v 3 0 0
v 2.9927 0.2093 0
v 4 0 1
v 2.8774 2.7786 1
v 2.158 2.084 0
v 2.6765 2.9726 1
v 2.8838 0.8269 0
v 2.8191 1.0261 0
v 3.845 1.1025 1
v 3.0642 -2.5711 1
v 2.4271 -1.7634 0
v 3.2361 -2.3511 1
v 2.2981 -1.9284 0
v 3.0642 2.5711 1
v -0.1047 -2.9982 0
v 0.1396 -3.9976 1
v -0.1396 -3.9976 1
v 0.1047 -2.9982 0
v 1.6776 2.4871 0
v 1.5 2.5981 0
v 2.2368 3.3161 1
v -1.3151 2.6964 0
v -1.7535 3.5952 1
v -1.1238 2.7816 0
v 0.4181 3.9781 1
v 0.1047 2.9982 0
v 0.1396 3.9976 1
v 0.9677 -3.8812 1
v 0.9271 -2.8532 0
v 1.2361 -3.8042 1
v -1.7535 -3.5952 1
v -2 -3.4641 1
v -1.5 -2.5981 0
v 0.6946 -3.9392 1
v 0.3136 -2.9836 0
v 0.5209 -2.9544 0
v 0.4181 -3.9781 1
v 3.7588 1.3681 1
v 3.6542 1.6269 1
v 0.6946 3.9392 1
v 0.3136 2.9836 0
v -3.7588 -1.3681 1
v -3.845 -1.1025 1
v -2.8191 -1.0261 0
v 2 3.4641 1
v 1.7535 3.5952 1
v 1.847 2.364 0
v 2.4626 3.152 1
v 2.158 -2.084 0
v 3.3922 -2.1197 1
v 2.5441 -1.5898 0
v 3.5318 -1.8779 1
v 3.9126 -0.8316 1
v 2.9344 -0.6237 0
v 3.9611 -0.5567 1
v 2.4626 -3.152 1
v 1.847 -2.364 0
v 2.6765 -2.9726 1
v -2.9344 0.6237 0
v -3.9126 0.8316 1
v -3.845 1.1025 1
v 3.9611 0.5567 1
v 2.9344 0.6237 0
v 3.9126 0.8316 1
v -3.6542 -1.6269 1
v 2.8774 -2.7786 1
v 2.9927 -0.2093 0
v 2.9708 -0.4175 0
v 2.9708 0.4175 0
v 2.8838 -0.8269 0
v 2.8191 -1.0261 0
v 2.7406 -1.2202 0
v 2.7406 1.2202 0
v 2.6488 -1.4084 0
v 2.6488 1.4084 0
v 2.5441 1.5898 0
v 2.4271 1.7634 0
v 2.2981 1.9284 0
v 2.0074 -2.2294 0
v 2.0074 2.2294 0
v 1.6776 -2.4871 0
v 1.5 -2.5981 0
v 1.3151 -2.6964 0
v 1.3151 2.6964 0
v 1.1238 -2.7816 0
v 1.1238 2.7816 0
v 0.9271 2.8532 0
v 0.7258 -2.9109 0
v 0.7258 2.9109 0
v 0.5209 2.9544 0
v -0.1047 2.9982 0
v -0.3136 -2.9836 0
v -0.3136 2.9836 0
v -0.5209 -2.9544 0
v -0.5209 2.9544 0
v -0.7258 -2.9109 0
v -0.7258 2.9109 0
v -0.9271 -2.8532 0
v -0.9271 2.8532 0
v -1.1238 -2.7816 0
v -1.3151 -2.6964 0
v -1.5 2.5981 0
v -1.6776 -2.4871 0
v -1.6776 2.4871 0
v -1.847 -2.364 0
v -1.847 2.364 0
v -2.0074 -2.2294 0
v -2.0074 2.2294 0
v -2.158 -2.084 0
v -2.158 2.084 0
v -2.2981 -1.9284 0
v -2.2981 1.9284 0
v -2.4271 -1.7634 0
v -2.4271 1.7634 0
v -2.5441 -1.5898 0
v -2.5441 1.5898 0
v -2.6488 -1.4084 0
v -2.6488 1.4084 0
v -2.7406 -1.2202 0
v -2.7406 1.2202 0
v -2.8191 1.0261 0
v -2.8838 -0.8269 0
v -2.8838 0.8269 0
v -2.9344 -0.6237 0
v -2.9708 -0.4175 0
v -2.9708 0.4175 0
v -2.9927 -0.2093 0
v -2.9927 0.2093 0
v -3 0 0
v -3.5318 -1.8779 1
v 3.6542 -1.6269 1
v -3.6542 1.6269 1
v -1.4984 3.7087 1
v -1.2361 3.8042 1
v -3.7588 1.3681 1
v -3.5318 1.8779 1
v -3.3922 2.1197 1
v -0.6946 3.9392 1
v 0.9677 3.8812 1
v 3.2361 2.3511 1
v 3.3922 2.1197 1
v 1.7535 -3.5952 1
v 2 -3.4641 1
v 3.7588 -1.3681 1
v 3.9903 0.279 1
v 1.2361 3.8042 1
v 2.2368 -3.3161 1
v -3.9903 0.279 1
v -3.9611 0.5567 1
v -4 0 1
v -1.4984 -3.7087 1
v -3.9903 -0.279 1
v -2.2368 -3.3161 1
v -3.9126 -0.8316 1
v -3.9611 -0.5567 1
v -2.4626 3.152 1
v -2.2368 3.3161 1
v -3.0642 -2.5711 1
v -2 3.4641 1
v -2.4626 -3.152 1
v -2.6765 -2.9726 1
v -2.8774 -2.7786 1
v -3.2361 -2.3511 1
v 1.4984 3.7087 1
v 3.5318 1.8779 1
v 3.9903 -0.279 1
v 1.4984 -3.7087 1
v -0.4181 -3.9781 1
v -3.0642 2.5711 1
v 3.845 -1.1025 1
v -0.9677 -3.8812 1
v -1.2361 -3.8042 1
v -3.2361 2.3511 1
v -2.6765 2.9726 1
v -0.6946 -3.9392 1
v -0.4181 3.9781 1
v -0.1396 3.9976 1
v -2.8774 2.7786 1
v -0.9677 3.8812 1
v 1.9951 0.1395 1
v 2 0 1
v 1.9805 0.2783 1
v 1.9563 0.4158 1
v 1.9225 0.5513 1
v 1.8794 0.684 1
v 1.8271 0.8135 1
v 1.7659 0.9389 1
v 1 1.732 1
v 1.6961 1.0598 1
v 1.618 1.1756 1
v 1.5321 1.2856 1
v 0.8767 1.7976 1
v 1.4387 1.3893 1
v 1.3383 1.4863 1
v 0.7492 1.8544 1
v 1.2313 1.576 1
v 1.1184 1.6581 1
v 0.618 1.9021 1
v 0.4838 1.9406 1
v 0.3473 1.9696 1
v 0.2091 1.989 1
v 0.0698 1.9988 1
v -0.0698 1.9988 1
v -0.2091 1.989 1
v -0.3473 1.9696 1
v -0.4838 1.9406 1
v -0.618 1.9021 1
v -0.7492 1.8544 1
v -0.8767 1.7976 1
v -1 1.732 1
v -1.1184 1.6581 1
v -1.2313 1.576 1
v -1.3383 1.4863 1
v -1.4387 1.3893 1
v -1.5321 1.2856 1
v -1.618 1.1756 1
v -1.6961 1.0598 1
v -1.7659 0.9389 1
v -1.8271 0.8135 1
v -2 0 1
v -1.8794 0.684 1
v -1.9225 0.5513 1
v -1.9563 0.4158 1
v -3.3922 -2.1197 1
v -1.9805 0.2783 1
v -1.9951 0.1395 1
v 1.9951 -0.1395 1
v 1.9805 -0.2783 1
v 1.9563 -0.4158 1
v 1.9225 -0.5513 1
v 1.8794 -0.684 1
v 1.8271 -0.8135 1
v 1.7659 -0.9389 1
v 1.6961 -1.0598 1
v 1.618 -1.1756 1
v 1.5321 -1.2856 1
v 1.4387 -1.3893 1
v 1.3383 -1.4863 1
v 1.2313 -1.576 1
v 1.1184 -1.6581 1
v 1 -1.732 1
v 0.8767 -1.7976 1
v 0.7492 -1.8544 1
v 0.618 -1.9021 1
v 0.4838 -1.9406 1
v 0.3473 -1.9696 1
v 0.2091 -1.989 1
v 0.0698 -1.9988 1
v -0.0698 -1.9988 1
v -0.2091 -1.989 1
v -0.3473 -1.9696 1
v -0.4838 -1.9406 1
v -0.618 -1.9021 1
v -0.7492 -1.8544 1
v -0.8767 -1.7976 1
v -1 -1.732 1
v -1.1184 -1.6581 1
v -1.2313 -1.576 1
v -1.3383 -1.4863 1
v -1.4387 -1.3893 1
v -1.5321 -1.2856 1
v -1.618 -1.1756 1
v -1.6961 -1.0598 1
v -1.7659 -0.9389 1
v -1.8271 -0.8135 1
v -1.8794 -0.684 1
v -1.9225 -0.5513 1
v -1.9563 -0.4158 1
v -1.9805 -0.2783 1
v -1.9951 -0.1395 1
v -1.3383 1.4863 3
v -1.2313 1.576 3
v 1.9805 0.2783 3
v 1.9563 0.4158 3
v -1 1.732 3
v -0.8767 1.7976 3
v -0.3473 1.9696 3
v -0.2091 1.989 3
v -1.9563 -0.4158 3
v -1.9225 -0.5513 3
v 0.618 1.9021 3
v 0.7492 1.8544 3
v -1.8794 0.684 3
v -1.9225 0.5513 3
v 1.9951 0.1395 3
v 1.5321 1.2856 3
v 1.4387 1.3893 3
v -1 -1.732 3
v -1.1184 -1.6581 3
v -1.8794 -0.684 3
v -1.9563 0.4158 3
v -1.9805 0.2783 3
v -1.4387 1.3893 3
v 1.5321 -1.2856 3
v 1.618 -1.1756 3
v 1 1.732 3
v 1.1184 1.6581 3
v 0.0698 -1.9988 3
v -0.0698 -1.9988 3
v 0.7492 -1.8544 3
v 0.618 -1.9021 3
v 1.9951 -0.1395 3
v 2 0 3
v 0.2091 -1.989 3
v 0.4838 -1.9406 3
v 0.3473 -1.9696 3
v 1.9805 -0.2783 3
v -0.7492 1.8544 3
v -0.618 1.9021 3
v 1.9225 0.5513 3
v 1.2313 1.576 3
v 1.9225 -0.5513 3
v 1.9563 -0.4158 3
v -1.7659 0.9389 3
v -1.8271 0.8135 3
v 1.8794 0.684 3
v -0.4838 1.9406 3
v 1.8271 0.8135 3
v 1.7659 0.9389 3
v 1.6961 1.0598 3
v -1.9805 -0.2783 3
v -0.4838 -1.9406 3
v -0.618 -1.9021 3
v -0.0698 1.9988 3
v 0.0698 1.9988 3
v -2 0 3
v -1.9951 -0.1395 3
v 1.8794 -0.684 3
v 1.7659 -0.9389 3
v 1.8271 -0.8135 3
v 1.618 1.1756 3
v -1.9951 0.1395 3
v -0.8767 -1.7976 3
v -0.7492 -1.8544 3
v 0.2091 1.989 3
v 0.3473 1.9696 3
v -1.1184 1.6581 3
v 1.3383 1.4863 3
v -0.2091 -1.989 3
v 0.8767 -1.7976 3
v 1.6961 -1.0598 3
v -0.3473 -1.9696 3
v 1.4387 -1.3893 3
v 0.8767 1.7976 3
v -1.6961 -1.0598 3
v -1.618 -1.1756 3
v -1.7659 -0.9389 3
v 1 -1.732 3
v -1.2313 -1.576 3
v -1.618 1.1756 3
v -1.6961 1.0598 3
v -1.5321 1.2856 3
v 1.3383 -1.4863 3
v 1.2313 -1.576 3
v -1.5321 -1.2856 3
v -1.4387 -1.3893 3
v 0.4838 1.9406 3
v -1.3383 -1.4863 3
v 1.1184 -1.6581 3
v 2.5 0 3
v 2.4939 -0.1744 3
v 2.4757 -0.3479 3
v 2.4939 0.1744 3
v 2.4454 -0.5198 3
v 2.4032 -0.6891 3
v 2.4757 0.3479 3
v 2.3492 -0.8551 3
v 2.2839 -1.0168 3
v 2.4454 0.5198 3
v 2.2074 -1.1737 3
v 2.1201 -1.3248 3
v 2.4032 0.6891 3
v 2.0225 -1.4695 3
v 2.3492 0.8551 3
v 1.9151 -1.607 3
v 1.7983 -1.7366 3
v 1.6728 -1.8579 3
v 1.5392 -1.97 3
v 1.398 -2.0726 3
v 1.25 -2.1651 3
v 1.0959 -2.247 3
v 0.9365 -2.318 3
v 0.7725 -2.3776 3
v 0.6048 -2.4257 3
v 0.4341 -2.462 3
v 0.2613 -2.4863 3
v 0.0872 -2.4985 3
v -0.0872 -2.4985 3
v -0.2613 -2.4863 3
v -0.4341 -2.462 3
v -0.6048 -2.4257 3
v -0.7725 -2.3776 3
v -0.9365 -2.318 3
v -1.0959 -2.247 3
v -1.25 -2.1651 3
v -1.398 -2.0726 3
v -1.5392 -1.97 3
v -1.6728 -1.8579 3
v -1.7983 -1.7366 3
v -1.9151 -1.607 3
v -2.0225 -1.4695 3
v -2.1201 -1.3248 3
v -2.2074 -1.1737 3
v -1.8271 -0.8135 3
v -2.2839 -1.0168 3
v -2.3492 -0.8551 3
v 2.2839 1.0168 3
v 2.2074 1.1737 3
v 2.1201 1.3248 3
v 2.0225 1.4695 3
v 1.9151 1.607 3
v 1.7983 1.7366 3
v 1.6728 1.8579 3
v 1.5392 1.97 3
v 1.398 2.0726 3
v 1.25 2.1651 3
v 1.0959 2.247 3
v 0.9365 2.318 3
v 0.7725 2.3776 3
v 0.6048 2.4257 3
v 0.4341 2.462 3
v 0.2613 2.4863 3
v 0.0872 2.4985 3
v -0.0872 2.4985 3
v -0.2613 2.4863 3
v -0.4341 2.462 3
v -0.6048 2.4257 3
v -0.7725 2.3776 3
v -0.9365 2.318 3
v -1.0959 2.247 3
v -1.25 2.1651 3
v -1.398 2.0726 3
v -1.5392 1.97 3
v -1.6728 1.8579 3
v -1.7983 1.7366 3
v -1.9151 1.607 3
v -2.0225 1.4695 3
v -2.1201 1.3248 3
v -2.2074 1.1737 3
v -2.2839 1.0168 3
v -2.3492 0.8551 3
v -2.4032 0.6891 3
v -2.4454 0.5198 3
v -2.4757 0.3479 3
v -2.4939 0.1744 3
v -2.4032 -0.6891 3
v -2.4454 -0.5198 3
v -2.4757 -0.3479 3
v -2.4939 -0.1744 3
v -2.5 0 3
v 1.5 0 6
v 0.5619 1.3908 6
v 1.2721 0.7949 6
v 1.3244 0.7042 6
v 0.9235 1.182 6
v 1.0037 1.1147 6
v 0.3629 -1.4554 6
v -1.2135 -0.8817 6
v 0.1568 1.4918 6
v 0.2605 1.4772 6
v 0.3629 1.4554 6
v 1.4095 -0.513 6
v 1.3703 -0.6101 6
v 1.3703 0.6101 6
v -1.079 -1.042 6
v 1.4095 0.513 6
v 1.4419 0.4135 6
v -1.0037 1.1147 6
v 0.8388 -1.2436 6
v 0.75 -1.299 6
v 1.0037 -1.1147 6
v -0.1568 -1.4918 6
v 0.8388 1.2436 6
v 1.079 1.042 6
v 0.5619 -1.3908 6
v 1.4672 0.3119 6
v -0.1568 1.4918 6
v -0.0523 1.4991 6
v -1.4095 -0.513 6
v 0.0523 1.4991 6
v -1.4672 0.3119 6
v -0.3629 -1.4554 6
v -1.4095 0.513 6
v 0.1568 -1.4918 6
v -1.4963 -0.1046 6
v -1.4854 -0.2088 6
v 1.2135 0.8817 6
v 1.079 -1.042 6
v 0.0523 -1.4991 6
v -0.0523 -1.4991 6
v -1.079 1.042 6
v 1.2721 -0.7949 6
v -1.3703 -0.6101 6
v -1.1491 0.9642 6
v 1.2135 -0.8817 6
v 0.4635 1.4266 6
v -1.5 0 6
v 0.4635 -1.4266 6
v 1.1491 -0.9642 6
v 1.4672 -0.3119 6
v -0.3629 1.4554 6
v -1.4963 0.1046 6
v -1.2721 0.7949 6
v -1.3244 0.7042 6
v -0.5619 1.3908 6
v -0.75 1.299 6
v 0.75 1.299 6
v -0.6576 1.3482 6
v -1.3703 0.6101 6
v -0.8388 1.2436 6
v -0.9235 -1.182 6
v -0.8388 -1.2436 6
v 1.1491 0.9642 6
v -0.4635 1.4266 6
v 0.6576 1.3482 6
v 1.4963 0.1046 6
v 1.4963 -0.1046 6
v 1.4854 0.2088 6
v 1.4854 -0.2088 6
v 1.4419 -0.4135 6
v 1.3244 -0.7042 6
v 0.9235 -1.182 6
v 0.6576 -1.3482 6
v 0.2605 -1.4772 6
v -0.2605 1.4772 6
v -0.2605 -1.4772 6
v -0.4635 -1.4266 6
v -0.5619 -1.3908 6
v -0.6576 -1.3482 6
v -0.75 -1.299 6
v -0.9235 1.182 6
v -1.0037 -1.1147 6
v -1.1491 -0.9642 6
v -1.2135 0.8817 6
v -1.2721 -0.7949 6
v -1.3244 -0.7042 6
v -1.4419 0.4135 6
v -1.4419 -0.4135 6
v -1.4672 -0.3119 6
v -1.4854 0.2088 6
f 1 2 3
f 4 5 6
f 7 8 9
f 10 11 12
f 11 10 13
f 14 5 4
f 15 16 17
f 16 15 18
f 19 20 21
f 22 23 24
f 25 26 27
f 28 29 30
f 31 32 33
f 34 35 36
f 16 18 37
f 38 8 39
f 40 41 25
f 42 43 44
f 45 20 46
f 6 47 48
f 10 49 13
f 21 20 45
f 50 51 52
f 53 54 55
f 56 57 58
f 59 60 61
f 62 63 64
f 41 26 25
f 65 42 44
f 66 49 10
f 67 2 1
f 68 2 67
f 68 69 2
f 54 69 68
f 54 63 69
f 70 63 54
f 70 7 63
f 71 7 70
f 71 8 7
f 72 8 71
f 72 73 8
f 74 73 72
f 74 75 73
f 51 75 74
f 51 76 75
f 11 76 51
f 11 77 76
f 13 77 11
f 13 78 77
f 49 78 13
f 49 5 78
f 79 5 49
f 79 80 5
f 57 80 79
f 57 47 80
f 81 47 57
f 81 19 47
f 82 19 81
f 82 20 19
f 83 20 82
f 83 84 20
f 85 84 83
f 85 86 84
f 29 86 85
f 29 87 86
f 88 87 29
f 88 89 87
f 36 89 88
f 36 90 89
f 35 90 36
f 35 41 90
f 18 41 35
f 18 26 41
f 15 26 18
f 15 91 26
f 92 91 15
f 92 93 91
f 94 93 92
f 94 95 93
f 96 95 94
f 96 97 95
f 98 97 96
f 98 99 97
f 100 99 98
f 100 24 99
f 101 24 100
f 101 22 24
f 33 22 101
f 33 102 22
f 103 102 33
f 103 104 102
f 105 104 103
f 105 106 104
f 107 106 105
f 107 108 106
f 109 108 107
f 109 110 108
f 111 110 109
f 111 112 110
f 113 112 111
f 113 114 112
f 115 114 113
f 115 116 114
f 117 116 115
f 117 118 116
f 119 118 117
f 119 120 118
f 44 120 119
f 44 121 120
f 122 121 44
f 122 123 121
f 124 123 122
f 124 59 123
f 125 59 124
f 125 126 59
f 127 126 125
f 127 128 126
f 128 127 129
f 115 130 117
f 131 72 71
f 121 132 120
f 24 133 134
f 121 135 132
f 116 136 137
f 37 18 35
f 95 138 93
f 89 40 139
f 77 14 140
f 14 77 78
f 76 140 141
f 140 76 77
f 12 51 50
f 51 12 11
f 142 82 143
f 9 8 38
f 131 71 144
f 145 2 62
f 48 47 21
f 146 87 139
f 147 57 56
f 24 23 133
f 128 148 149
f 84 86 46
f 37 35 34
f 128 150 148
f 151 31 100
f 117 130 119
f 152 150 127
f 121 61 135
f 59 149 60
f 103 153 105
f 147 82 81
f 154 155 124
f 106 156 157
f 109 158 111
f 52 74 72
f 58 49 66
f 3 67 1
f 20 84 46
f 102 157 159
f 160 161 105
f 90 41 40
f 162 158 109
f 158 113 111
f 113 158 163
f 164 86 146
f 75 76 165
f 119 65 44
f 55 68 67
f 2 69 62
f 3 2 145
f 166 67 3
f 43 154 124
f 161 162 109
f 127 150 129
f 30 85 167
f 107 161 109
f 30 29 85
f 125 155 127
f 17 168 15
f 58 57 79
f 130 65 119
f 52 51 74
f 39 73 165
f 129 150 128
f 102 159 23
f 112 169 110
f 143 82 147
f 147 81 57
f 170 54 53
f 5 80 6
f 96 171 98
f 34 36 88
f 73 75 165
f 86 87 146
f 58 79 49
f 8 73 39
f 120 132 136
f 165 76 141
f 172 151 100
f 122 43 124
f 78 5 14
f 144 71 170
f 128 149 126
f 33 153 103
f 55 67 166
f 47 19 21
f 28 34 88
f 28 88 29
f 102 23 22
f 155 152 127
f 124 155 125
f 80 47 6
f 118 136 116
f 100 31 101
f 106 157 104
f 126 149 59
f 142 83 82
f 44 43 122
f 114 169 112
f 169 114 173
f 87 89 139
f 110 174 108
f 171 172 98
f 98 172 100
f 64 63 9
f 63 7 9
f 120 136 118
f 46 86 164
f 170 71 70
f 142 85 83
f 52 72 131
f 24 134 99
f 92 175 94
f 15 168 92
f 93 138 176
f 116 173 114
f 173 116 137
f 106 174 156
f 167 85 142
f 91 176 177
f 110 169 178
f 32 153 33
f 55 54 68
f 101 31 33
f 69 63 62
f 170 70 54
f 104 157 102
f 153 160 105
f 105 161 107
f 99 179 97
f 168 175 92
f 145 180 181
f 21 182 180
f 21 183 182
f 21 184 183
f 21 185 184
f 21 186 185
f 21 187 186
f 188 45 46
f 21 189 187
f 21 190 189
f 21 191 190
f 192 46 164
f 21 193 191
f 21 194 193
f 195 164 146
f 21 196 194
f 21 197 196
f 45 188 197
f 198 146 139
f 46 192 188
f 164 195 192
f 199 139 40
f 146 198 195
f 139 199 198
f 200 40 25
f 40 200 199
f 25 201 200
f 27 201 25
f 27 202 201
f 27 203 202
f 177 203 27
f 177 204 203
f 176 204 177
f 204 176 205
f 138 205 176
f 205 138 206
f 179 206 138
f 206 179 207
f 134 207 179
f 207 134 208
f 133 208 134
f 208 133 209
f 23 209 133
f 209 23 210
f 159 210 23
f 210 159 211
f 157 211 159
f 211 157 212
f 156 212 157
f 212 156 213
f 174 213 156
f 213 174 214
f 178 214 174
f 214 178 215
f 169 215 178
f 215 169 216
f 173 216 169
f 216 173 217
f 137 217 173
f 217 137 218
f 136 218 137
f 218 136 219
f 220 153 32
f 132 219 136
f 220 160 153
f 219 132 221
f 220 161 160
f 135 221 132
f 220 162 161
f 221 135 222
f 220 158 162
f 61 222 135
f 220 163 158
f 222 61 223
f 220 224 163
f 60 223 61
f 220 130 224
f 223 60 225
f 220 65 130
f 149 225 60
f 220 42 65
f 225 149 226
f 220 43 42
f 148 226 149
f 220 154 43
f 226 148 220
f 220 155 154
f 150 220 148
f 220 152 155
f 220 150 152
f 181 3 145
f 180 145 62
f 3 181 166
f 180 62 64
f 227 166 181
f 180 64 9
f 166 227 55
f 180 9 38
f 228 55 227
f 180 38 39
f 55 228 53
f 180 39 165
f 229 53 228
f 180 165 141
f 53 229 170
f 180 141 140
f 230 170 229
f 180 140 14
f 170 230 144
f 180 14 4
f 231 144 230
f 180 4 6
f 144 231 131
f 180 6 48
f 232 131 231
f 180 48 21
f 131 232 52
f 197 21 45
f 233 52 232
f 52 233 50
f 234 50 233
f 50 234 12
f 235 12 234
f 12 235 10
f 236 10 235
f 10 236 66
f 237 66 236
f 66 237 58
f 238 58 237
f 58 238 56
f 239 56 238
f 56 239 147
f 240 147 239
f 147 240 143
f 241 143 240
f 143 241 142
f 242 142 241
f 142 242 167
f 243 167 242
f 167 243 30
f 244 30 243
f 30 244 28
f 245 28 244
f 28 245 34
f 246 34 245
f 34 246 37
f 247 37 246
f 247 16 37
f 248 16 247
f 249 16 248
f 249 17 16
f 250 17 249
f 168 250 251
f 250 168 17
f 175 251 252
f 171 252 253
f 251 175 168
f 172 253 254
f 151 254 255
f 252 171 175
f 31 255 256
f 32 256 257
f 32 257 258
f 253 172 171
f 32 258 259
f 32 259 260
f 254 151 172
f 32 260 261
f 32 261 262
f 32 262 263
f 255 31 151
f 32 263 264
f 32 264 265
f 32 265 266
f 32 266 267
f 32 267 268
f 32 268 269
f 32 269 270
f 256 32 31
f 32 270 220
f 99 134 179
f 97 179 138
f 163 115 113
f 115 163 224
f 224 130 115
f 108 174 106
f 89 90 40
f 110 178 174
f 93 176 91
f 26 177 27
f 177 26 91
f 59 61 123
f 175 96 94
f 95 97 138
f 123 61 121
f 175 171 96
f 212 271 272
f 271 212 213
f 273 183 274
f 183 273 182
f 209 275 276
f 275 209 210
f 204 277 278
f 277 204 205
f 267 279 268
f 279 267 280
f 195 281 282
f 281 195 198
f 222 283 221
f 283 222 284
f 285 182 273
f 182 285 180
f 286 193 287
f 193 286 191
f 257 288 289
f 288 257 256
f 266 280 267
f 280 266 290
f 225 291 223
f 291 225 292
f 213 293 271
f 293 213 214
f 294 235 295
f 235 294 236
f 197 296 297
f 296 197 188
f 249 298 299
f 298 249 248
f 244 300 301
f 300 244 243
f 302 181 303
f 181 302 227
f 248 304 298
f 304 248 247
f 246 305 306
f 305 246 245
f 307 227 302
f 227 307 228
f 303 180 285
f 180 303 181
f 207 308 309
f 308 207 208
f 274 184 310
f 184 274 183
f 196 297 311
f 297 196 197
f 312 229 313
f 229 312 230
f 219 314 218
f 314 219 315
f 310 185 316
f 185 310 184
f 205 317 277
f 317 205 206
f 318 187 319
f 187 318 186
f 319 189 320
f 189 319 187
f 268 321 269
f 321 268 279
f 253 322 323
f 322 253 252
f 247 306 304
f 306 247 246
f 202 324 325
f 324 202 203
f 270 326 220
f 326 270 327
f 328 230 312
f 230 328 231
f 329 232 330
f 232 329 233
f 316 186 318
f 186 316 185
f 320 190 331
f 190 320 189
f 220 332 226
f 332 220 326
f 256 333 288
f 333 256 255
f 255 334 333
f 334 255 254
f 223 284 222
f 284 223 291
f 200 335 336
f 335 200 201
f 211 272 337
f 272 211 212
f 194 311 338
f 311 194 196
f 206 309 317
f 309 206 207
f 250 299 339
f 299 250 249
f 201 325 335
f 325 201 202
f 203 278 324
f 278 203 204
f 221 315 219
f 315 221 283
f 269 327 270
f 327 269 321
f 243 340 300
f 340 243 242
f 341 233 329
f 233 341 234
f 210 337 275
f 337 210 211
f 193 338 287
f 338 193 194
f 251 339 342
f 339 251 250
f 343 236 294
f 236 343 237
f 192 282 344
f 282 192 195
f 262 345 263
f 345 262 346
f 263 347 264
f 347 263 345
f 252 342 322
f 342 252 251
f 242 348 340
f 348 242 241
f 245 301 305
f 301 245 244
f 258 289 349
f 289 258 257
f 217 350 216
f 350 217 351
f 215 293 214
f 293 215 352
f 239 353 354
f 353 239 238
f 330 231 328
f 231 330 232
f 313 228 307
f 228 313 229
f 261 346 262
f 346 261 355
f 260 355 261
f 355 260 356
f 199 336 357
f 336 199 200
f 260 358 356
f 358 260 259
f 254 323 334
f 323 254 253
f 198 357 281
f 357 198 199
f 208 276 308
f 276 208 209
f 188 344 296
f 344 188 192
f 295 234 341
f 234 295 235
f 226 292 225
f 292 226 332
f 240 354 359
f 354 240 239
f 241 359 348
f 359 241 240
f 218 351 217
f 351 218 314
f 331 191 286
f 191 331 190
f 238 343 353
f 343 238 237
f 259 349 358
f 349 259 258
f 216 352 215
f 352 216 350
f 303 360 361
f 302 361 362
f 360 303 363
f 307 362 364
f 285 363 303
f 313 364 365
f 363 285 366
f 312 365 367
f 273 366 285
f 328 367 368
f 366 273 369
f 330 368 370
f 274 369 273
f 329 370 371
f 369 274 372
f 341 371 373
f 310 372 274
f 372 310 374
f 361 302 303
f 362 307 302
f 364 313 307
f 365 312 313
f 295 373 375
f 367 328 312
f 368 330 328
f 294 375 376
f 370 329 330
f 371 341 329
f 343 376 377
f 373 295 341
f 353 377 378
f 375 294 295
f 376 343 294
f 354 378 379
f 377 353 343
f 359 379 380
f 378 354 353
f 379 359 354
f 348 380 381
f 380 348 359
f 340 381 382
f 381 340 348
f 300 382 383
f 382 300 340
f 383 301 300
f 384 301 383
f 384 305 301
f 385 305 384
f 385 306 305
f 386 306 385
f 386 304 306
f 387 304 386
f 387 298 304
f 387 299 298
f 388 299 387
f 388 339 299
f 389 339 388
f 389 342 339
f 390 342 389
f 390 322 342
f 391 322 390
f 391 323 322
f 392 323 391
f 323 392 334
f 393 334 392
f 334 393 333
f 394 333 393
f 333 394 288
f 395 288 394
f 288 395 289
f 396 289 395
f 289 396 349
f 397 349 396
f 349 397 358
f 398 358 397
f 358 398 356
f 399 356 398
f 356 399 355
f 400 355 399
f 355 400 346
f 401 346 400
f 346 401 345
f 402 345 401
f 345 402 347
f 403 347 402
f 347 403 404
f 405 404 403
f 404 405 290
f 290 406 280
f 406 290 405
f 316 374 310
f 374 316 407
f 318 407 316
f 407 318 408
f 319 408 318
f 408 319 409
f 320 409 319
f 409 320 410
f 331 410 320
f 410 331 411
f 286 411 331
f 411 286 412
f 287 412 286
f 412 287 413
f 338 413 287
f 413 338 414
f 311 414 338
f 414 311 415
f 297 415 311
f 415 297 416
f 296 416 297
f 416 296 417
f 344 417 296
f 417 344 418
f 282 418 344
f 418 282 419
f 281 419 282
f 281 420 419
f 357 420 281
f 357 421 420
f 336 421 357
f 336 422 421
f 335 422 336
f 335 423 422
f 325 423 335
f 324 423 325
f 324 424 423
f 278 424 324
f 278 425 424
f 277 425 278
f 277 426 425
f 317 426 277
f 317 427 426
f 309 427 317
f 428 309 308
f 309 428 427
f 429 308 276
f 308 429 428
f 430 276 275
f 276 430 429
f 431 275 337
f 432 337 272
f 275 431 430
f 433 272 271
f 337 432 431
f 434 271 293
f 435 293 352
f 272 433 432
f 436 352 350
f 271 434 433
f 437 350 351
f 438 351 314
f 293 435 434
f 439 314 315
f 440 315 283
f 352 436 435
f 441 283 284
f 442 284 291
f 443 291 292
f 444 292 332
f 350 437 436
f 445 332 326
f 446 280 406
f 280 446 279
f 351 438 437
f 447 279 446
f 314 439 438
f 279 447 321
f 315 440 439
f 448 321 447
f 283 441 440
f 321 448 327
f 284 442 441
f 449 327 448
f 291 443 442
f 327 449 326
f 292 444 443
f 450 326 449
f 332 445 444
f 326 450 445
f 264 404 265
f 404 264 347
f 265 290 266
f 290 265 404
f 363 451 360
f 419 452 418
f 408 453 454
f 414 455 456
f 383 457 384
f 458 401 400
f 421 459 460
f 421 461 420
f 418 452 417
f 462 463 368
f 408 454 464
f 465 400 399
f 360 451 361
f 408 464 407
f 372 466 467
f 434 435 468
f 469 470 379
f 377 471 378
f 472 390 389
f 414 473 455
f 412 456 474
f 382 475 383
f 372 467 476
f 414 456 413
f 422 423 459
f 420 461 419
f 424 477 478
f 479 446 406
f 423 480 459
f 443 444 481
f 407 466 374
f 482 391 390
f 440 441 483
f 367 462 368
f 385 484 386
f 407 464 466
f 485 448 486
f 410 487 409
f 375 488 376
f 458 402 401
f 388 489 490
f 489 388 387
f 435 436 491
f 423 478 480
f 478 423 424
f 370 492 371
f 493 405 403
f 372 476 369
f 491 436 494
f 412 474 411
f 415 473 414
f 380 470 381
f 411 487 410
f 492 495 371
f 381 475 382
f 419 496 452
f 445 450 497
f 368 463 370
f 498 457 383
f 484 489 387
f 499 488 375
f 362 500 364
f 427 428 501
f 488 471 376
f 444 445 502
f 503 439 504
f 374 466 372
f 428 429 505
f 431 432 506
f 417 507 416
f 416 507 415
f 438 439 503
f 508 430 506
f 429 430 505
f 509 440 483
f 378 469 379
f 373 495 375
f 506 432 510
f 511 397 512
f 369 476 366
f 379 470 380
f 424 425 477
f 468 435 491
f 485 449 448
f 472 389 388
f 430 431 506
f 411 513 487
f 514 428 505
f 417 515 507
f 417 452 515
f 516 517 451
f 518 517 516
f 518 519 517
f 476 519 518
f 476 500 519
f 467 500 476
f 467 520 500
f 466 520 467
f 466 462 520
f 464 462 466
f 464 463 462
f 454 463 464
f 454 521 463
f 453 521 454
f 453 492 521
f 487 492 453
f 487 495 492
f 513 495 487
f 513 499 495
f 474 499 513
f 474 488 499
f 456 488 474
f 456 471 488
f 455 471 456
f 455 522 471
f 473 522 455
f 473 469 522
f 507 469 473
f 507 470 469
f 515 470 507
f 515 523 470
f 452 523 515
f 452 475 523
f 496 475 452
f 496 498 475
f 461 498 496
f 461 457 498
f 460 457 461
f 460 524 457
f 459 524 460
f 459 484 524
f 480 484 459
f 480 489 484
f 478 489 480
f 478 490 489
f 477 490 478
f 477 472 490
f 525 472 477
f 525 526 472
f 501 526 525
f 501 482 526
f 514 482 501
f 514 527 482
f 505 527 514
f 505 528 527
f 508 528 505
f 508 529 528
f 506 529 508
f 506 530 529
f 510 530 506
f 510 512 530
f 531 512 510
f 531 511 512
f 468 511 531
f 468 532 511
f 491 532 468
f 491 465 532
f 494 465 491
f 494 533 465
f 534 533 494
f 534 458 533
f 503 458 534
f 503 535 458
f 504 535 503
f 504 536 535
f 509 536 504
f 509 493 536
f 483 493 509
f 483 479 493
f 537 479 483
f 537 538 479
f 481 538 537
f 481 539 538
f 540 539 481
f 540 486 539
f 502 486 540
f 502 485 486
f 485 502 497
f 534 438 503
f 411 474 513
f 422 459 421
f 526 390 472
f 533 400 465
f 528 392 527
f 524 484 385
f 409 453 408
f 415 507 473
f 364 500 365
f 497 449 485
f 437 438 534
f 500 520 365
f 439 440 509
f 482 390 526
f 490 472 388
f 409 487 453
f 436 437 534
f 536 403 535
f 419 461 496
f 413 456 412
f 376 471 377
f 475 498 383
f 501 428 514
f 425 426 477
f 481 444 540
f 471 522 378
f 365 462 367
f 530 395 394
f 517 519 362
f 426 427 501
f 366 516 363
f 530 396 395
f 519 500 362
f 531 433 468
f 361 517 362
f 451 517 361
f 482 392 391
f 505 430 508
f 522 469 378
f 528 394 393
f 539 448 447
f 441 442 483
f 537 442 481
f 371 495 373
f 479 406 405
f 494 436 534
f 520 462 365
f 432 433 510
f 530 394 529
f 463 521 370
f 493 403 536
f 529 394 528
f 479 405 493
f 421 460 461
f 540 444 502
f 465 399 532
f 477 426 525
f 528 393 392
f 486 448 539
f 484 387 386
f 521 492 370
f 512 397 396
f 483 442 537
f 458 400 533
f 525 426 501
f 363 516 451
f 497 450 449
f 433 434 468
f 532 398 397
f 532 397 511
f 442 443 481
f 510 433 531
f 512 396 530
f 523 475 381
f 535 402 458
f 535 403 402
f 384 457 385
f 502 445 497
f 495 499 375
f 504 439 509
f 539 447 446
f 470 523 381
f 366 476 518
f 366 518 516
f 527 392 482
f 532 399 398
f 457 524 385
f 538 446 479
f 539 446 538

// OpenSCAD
//
//  SmallPlug.scad
//
//  Evilteach
//
//  07/22/2016
//
//  A model to allow construction of a small plug.
//  in my case it fills a small hole in the bottom of my lawnmower.
//  It may be of use to you.   If it is, leave me a note.
//


$fn = 90;

bottomRadius = 4;
bottomHeight = 1;

shaftRadius  = 2;
shaftHeight  = 2;

topRadius    = 2.5;
topHeight    = 3;

module bottom()
{
    color("cyan")
        cylinder(r2 = bottomRadius, r1 = bottomRadius - 1, h = bottomHeight);
}

module shaft()
{
    color("yellow")
        translate([0, 0, bottomHeight])
            cylinder(r = shaftRadius, h = shaftHeight);
}

module top()
{
    color("lime")
        translate([0, 0, bottomHeight + shaftHeight])
            cylinder(r1=topRadius, r2=topRadius - 1, h=topHeight);
}

module main()
{
    bottom();
    shaft();
    top();
}

main();
